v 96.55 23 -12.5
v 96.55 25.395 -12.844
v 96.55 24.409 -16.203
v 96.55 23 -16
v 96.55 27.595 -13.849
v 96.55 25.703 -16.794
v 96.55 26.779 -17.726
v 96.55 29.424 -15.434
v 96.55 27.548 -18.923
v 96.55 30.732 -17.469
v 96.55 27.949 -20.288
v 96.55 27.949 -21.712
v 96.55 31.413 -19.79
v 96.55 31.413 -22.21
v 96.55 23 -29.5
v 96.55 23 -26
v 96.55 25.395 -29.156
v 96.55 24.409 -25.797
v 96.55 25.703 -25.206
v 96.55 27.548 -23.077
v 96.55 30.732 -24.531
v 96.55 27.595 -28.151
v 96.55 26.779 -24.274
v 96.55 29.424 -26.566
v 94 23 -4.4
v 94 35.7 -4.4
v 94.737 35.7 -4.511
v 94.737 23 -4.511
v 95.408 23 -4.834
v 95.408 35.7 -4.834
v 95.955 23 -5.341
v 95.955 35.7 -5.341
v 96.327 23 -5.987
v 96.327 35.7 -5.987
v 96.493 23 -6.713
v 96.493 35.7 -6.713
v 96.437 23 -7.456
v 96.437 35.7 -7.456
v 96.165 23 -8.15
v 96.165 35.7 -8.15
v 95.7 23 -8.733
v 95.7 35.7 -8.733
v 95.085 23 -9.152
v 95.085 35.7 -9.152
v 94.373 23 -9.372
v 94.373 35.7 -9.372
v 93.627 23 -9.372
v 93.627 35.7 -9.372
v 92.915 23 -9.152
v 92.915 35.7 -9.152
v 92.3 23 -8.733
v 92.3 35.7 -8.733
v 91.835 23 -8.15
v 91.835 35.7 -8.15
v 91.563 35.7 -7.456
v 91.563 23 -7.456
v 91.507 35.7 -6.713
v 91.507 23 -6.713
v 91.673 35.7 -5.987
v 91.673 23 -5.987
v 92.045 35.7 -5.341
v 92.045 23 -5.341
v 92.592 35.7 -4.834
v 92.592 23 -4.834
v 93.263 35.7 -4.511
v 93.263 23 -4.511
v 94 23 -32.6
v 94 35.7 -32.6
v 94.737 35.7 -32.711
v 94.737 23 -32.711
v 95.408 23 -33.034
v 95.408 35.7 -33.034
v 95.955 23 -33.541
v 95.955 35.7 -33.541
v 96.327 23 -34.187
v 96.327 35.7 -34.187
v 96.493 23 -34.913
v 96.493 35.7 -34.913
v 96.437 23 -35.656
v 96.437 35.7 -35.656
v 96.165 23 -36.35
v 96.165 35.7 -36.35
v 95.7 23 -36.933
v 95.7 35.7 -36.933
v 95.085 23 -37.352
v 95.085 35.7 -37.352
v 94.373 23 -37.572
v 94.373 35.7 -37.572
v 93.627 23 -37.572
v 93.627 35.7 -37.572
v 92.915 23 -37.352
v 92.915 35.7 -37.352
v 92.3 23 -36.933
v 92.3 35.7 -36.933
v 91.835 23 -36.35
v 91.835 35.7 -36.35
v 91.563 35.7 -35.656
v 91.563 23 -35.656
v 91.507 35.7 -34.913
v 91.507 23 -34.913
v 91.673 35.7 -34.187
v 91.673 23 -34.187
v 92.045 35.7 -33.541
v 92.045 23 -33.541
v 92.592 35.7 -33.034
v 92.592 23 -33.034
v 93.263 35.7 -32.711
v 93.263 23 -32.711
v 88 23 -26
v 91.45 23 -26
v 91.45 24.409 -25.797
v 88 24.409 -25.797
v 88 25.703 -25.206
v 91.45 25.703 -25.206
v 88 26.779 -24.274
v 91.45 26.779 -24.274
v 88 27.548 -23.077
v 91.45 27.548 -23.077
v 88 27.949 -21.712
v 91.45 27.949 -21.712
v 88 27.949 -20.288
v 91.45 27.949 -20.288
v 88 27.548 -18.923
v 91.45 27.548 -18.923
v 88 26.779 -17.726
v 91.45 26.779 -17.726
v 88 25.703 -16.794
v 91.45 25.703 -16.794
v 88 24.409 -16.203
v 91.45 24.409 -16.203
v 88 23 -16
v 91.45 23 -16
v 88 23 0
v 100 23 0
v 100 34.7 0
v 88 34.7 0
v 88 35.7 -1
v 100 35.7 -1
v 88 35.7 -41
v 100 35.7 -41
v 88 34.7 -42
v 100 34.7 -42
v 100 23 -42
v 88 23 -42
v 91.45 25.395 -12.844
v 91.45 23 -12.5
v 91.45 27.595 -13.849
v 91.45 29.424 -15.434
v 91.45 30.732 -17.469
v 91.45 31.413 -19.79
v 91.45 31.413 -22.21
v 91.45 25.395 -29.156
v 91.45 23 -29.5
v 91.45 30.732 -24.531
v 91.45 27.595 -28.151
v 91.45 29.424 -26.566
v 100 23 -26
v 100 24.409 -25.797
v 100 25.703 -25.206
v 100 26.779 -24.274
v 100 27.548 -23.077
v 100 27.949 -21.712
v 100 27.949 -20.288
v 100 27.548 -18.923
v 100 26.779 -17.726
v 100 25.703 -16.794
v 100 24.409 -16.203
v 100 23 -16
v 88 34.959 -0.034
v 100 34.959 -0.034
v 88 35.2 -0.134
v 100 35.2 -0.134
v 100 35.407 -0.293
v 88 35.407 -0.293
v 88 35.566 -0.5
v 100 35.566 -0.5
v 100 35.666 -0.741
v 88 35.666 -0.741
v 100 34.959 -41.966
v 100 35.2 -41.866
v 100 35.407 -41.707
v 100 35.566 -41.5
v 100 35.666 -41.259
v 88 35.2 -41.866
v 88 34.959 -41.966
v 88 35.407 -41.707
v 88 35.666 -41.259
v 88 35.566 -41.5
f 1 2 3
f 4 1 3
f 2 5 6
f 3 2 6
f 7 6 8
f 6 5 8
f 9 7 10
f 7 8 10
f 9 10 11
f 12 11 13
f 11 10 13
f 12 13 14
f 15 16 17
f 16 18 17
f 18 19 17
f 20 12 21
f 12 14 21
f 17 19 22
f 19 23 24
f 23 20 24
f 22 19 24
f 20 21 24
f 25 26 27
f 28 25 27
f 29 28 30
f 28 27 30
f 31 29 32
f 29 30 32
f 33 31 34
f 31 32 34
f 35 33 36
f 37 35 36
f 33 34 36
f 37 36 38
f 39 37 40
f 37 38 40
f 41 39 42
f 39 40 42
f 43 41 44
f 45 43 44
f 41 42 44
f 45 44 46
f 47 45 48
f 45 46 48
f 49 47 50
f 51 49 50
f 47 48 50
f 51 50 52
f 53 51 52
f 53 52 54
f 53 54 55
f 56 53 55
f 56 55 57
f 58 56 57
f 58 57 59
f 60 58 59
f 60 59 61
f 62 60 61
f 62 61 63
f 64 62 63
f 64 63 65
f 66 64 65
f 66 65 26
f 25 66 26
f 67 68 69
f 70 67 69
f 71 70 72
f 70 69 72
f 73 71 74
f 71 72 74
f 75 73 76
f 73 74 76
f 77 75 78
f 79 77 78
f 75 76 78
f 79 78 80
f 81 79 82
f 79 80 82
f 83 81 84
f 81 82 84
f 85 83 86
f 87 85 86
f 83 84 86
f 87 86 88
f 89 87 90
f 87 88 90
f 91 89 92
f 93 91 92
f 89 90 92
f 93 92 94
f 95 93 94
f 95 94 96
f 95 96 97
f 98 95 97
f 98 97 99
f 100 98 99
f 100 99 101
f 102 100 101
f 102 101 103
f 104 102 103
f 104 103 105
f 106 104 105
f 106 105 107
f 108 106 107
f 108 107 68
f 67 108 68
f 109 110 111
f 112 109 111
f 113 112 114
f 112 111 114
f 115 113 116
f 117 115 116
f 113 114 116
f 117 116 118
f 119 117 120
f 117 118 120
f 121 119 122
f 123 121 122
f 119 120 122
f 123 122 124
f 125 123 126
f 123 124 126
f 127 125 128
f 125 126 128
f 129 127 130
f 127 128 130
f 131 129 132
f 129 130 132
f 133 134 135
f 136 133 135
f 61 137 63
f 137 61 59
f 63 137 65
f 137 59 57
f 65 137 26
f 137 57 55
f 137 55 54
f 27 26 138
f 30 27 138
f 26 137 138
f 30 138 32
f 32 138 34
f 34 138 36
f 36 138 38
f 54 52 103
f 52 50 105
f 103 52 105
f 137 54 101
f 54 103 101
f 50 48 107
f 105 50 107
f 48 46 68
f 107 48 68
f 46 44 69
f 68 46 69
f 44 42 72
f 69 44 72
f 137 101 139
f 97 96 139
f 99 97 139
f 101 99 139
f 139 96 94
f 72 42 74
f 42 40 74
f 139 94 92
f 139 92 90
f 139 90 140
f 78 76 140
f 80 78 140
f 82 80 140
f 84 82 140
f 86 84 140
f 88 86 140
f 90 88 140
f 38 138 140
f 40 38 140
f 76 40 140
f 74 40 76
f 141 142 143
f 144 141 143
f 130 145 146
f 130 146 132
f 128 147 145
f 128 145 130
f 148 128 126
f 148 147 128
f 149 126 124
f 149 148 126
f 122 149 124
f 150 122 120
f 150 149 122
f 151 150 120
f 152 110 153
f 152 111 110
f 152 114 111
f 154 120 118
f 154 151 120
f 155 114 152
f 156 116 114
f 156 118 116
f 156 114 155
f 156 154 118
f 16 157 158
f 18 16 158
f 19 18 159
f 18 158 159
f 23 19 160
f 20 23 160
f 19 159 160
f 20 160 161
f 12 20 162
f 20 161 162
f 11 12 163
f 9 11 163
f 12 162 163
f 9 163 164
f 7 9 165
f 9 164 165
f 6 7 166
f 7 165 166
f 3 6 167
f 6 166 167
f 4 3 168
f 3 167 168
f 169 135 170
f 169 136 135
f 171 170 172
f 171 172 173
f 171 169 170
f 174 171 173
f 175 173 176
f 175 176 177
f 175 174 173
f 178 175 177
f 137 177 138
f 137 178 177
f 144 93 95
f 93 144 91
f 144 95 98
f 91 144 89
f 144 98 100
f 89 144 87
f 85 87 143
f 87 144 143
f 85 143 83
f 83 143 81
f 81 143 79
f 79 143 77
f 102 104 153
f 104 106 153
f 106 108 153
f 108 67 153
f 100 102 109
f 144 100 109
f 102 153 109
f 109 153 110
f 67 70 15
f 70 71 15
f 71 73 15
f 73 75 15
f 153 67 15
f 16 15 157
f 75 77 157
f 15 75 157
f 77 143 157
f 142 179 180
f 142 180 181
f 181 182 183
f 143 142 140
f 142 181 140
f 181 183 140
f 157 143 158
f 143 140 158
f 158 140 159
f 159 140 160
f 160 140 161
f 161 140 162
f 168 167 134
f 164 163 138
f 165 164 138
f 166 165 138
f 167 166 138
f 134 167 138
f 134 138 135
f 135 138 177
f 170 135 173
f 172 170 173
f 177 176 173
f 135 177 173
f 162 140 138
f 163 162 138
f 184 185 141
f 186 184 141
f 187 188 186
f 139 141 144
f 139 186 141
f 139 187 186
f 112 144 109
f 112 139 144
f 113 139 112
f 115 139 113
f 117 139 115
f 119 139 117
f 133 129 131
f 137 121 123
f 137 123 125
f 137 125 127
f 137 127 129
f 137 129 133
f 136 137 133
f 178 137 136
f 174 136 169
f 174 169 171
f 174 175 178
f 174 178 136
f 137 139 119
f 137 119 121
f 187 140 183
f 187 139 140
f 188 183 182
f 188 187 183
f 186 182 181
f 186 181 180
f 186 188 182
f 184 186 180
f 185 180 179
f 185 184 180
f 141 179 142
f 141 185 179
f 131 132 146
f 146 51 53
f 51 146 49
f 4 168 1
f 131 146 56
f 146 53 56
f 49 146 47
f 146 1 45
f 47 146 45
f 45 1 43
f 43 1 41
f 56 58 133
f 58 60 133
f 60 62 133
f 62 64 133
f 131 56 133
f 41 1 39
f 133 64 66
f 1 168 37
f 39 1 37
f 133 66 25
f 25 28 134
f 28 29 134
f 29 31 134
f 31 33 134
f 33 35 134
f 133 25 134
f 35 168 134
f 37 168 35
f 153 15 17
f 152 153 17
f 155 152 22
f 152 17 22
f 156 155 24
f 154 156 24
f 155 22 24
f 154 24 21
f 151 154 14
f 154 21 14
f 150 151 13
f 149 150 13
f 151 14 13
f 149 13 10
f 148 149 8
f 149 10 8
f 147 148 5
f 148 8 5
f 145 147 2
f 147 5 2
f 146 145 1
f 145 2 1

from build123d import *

# Parameters (mm, degrees)
BOSS_EXTRUDE1_DEPTH = 12
SKETCH2_R           = 8.5
CUT_EXTRUDE1_DEPTH  = 2.55
CUT_EXTRUDE2_REACH  = 111.203
SKETCH3_R           = 2.5
FILLET1_R           = 1


with BuildPart() as part:
    # Sketch1 → Boss-Extrude1 (new body)
    with BuildSketch(Plane(origin=(100, 0, 0), x_dir=(0, 0, -1), z_dir=(1, 0, 0))):
        with BuildLine():
            Line((0, 23), (0, 35.7))
            Line((0, 35.7), (42, 35.7))
            Line((42, 35.7), (42, 23))
            Line((42, 23), (26, 23))
            ThreePointArc((26, 23), (21, 28), (16, 23))
            Line((16, 23), (0, 23))
        make_face()
    extrude(amount=-BOSS_EXTRUDE1_DEPTH)

    # Sketch2 → Cut-Extrude1 (cut, symmetric)
    with BuildSketch(Plane(origin=(94, 0, 0), x_dir=(0, 0, -1), z_dir=(1, 0, 0))):
        with Locations((21, 23)):
            Circle(SKETCH2_R)
    extrude(amount=CUT_EXTRUDE1_DEPTH, both=True, mode=Mode.SUBTRACT)

    # Sketch3 → Cut-Extrude2 (cut, up to next)
    with BuildSketch(Plane(origin=(0, 35.7, 0), x_dir=(1, 0, 0), z_dir=(0, 1, 0)), mode=Mode.PRIVATE) as cut_extrude2_sk1:
        with Locations(Location((94, 35.1, 0), (0, 0, 270))):
            Circle(SKETCH3_R)
    cut_extrude2_tool1 = extrude(cut_extrude2_sk1.sketch, amount=-CUT_EXTRUDE2_REACH, mode=Mode.PRIVATE) & part.part
    # Sketch3 → Cut-Extrude2 (cut, up to next)
    with BuildSketch(Plane(origin=(0, 35.7, 0), x_dir=(1, 0, 0), z_dir=(0, 1, 0)), mode=Mode.PRIVATE) as cut_extrude2_sk2:
        with Locations(Location((94, 6.9, 0), (0, 0, 270))):
            Circle(SKETCH3_R)
    cut_extrude2_tool2 = extrude(cut_extrude2_sk2.sketch, amount=-CUT_EXTRUDE2_REACH, mode=Mode.PRIVATE) & part.part
    add(cut_extrude2_tool1.solids().sort_by_distance((94, 35.7, -35.1))[0], mode=Mode.SUBTRACT)
    add(cut_extrude2_tool2.solids().sort_by_distance((94, 35.7, -6.9))[0], mode=Mode.SUBTRACT)

    # Fillet1
    fillet1_edges = [part.edges().sort_by_distance(p)[0] for p in [
        (94, 35.7, 0),
        (94, 35.7, -42),
    ]]
    fillet(fillet1_edges, radius=FILLET1_R)


solid = part.part
